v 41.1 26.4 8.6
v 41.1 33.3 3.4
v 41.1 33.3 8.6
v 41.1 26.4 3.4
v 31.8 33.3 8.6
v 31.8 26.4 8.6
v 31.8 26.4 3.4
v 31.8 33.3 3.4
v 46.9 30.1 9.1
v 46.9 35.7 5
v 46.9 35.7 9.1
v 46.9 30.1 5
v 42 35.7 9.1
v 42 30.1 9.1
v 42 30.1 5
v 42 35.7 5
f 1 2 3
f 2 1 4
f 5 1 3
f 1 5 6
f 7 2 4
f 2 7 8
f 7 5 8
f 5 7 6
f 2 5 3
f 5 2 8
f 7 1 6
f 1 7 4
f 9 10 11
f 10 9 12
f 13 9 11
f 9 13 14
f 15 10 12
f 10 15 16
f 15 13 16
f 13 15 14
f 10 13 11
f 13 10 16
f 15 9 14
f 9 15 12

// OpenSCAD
union() {
  translate([31.8, 26.4, 3.4]) cube(size=[9.3,6.9,5.2], center=false);
  translate([42.0, 30.1, 5.0]) cube(size=[4.9,5.6,4.1], center=false);
}
